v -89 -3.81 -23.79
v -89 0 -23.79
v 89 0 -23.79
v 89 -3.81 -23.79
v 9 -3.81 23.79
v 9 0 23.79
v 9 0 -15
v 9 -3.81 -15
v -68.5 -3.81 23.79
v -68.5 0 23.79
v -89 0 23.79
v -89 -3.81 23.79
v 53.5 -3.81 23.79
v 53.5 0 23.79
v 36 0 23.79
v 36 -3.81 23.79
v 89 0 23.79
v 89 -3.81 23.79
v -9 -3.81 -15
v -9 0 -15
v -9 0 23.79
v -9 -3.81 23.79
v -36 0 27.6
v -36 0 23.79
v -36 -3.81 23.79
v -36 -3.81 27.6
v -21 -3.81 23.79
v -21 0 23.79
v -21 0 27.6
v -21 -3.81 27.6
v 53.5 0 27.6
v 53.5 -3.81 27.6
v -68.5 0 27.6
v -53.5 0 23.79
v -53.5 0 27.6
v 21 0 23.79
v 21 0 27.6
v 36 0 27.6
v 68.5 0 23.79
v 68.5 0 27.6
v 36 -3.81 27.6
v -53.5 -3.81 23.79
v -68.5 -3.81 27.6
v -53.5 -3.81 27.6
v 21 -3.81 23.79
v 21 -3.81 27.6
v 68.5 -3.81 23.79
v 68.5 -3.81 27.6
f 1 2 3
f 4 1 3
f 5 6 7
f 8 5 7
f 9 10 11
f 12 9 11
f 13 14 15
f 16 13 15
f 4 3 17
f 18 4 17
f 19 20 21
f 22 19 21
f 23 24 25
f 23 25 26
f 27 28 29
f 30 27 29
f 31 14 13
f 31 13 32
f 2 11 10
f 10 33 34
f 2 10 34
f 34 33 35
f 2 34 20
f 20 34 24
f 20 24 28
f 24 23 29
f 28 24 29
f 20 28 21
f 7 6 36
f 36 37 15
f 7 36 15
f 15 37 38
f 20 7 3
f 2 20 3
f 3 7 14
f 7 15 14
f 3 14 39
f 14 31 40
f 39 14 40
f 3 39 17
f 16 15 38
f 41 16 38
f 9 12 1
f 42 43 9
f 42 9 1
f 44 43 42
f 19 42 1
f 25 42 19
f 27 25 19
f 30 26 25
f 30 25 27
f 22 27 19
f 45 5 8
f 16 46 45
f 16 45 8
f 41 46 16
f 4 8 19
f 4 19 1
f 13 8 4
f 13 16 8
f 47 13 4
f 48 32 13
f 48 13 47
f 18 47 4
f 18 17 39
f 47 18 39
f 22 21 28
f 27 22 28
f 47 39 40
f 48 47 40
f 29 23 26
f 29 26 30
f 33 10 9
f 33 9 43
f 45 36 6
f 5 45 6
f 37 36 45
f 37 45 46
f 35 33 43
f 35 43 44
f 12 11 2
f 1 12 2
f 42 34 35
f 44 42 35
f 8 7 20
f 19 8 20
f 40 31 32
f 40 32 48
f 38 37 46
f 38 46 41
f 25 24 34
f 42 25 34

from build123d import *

# Parameters (mm, degrees)
F0_W     = 15
F0_H     = 3.81
F1_DEPTH = 3.81


with BuildPart() as f1:
    # F0 (on Front) → F1 (new body)
    with BuildSketch(Plane.XZ):
        Polygon((89, -23.79), (89, 23.79), (68.5, 23.79), (53.5, 23.79), (36, 23.79), (21, 23.79), (9, 23.79), (9, 0), (9, -15), (0, -15), (0, -23.79), align=None)
        Polygon((-89, -23.79), (0, -23.79), (0, -15), (-9, -15), (-9, 0), (-9, 23.79), (-21, 23.79), (-36, 23.79), (-53.5, 23.79), (-68.5, 23.79), (-89, 23.79), align=None)
        with Locations((-61, 25.695)):
            Rectangle(F0_W, F0_H)
        with Locations((-28.5, 25.695)):
            Rectangle(F0_W, F0_H)
        with Locations((28.5, 25.695)):
            Rectangle(F0_W, F0_H)
        with Locations((61, 25.695)):
            Rectangle(F0_W, F0_H)
    extrude(amount=F1_DEPTH)


solid = f1.part
